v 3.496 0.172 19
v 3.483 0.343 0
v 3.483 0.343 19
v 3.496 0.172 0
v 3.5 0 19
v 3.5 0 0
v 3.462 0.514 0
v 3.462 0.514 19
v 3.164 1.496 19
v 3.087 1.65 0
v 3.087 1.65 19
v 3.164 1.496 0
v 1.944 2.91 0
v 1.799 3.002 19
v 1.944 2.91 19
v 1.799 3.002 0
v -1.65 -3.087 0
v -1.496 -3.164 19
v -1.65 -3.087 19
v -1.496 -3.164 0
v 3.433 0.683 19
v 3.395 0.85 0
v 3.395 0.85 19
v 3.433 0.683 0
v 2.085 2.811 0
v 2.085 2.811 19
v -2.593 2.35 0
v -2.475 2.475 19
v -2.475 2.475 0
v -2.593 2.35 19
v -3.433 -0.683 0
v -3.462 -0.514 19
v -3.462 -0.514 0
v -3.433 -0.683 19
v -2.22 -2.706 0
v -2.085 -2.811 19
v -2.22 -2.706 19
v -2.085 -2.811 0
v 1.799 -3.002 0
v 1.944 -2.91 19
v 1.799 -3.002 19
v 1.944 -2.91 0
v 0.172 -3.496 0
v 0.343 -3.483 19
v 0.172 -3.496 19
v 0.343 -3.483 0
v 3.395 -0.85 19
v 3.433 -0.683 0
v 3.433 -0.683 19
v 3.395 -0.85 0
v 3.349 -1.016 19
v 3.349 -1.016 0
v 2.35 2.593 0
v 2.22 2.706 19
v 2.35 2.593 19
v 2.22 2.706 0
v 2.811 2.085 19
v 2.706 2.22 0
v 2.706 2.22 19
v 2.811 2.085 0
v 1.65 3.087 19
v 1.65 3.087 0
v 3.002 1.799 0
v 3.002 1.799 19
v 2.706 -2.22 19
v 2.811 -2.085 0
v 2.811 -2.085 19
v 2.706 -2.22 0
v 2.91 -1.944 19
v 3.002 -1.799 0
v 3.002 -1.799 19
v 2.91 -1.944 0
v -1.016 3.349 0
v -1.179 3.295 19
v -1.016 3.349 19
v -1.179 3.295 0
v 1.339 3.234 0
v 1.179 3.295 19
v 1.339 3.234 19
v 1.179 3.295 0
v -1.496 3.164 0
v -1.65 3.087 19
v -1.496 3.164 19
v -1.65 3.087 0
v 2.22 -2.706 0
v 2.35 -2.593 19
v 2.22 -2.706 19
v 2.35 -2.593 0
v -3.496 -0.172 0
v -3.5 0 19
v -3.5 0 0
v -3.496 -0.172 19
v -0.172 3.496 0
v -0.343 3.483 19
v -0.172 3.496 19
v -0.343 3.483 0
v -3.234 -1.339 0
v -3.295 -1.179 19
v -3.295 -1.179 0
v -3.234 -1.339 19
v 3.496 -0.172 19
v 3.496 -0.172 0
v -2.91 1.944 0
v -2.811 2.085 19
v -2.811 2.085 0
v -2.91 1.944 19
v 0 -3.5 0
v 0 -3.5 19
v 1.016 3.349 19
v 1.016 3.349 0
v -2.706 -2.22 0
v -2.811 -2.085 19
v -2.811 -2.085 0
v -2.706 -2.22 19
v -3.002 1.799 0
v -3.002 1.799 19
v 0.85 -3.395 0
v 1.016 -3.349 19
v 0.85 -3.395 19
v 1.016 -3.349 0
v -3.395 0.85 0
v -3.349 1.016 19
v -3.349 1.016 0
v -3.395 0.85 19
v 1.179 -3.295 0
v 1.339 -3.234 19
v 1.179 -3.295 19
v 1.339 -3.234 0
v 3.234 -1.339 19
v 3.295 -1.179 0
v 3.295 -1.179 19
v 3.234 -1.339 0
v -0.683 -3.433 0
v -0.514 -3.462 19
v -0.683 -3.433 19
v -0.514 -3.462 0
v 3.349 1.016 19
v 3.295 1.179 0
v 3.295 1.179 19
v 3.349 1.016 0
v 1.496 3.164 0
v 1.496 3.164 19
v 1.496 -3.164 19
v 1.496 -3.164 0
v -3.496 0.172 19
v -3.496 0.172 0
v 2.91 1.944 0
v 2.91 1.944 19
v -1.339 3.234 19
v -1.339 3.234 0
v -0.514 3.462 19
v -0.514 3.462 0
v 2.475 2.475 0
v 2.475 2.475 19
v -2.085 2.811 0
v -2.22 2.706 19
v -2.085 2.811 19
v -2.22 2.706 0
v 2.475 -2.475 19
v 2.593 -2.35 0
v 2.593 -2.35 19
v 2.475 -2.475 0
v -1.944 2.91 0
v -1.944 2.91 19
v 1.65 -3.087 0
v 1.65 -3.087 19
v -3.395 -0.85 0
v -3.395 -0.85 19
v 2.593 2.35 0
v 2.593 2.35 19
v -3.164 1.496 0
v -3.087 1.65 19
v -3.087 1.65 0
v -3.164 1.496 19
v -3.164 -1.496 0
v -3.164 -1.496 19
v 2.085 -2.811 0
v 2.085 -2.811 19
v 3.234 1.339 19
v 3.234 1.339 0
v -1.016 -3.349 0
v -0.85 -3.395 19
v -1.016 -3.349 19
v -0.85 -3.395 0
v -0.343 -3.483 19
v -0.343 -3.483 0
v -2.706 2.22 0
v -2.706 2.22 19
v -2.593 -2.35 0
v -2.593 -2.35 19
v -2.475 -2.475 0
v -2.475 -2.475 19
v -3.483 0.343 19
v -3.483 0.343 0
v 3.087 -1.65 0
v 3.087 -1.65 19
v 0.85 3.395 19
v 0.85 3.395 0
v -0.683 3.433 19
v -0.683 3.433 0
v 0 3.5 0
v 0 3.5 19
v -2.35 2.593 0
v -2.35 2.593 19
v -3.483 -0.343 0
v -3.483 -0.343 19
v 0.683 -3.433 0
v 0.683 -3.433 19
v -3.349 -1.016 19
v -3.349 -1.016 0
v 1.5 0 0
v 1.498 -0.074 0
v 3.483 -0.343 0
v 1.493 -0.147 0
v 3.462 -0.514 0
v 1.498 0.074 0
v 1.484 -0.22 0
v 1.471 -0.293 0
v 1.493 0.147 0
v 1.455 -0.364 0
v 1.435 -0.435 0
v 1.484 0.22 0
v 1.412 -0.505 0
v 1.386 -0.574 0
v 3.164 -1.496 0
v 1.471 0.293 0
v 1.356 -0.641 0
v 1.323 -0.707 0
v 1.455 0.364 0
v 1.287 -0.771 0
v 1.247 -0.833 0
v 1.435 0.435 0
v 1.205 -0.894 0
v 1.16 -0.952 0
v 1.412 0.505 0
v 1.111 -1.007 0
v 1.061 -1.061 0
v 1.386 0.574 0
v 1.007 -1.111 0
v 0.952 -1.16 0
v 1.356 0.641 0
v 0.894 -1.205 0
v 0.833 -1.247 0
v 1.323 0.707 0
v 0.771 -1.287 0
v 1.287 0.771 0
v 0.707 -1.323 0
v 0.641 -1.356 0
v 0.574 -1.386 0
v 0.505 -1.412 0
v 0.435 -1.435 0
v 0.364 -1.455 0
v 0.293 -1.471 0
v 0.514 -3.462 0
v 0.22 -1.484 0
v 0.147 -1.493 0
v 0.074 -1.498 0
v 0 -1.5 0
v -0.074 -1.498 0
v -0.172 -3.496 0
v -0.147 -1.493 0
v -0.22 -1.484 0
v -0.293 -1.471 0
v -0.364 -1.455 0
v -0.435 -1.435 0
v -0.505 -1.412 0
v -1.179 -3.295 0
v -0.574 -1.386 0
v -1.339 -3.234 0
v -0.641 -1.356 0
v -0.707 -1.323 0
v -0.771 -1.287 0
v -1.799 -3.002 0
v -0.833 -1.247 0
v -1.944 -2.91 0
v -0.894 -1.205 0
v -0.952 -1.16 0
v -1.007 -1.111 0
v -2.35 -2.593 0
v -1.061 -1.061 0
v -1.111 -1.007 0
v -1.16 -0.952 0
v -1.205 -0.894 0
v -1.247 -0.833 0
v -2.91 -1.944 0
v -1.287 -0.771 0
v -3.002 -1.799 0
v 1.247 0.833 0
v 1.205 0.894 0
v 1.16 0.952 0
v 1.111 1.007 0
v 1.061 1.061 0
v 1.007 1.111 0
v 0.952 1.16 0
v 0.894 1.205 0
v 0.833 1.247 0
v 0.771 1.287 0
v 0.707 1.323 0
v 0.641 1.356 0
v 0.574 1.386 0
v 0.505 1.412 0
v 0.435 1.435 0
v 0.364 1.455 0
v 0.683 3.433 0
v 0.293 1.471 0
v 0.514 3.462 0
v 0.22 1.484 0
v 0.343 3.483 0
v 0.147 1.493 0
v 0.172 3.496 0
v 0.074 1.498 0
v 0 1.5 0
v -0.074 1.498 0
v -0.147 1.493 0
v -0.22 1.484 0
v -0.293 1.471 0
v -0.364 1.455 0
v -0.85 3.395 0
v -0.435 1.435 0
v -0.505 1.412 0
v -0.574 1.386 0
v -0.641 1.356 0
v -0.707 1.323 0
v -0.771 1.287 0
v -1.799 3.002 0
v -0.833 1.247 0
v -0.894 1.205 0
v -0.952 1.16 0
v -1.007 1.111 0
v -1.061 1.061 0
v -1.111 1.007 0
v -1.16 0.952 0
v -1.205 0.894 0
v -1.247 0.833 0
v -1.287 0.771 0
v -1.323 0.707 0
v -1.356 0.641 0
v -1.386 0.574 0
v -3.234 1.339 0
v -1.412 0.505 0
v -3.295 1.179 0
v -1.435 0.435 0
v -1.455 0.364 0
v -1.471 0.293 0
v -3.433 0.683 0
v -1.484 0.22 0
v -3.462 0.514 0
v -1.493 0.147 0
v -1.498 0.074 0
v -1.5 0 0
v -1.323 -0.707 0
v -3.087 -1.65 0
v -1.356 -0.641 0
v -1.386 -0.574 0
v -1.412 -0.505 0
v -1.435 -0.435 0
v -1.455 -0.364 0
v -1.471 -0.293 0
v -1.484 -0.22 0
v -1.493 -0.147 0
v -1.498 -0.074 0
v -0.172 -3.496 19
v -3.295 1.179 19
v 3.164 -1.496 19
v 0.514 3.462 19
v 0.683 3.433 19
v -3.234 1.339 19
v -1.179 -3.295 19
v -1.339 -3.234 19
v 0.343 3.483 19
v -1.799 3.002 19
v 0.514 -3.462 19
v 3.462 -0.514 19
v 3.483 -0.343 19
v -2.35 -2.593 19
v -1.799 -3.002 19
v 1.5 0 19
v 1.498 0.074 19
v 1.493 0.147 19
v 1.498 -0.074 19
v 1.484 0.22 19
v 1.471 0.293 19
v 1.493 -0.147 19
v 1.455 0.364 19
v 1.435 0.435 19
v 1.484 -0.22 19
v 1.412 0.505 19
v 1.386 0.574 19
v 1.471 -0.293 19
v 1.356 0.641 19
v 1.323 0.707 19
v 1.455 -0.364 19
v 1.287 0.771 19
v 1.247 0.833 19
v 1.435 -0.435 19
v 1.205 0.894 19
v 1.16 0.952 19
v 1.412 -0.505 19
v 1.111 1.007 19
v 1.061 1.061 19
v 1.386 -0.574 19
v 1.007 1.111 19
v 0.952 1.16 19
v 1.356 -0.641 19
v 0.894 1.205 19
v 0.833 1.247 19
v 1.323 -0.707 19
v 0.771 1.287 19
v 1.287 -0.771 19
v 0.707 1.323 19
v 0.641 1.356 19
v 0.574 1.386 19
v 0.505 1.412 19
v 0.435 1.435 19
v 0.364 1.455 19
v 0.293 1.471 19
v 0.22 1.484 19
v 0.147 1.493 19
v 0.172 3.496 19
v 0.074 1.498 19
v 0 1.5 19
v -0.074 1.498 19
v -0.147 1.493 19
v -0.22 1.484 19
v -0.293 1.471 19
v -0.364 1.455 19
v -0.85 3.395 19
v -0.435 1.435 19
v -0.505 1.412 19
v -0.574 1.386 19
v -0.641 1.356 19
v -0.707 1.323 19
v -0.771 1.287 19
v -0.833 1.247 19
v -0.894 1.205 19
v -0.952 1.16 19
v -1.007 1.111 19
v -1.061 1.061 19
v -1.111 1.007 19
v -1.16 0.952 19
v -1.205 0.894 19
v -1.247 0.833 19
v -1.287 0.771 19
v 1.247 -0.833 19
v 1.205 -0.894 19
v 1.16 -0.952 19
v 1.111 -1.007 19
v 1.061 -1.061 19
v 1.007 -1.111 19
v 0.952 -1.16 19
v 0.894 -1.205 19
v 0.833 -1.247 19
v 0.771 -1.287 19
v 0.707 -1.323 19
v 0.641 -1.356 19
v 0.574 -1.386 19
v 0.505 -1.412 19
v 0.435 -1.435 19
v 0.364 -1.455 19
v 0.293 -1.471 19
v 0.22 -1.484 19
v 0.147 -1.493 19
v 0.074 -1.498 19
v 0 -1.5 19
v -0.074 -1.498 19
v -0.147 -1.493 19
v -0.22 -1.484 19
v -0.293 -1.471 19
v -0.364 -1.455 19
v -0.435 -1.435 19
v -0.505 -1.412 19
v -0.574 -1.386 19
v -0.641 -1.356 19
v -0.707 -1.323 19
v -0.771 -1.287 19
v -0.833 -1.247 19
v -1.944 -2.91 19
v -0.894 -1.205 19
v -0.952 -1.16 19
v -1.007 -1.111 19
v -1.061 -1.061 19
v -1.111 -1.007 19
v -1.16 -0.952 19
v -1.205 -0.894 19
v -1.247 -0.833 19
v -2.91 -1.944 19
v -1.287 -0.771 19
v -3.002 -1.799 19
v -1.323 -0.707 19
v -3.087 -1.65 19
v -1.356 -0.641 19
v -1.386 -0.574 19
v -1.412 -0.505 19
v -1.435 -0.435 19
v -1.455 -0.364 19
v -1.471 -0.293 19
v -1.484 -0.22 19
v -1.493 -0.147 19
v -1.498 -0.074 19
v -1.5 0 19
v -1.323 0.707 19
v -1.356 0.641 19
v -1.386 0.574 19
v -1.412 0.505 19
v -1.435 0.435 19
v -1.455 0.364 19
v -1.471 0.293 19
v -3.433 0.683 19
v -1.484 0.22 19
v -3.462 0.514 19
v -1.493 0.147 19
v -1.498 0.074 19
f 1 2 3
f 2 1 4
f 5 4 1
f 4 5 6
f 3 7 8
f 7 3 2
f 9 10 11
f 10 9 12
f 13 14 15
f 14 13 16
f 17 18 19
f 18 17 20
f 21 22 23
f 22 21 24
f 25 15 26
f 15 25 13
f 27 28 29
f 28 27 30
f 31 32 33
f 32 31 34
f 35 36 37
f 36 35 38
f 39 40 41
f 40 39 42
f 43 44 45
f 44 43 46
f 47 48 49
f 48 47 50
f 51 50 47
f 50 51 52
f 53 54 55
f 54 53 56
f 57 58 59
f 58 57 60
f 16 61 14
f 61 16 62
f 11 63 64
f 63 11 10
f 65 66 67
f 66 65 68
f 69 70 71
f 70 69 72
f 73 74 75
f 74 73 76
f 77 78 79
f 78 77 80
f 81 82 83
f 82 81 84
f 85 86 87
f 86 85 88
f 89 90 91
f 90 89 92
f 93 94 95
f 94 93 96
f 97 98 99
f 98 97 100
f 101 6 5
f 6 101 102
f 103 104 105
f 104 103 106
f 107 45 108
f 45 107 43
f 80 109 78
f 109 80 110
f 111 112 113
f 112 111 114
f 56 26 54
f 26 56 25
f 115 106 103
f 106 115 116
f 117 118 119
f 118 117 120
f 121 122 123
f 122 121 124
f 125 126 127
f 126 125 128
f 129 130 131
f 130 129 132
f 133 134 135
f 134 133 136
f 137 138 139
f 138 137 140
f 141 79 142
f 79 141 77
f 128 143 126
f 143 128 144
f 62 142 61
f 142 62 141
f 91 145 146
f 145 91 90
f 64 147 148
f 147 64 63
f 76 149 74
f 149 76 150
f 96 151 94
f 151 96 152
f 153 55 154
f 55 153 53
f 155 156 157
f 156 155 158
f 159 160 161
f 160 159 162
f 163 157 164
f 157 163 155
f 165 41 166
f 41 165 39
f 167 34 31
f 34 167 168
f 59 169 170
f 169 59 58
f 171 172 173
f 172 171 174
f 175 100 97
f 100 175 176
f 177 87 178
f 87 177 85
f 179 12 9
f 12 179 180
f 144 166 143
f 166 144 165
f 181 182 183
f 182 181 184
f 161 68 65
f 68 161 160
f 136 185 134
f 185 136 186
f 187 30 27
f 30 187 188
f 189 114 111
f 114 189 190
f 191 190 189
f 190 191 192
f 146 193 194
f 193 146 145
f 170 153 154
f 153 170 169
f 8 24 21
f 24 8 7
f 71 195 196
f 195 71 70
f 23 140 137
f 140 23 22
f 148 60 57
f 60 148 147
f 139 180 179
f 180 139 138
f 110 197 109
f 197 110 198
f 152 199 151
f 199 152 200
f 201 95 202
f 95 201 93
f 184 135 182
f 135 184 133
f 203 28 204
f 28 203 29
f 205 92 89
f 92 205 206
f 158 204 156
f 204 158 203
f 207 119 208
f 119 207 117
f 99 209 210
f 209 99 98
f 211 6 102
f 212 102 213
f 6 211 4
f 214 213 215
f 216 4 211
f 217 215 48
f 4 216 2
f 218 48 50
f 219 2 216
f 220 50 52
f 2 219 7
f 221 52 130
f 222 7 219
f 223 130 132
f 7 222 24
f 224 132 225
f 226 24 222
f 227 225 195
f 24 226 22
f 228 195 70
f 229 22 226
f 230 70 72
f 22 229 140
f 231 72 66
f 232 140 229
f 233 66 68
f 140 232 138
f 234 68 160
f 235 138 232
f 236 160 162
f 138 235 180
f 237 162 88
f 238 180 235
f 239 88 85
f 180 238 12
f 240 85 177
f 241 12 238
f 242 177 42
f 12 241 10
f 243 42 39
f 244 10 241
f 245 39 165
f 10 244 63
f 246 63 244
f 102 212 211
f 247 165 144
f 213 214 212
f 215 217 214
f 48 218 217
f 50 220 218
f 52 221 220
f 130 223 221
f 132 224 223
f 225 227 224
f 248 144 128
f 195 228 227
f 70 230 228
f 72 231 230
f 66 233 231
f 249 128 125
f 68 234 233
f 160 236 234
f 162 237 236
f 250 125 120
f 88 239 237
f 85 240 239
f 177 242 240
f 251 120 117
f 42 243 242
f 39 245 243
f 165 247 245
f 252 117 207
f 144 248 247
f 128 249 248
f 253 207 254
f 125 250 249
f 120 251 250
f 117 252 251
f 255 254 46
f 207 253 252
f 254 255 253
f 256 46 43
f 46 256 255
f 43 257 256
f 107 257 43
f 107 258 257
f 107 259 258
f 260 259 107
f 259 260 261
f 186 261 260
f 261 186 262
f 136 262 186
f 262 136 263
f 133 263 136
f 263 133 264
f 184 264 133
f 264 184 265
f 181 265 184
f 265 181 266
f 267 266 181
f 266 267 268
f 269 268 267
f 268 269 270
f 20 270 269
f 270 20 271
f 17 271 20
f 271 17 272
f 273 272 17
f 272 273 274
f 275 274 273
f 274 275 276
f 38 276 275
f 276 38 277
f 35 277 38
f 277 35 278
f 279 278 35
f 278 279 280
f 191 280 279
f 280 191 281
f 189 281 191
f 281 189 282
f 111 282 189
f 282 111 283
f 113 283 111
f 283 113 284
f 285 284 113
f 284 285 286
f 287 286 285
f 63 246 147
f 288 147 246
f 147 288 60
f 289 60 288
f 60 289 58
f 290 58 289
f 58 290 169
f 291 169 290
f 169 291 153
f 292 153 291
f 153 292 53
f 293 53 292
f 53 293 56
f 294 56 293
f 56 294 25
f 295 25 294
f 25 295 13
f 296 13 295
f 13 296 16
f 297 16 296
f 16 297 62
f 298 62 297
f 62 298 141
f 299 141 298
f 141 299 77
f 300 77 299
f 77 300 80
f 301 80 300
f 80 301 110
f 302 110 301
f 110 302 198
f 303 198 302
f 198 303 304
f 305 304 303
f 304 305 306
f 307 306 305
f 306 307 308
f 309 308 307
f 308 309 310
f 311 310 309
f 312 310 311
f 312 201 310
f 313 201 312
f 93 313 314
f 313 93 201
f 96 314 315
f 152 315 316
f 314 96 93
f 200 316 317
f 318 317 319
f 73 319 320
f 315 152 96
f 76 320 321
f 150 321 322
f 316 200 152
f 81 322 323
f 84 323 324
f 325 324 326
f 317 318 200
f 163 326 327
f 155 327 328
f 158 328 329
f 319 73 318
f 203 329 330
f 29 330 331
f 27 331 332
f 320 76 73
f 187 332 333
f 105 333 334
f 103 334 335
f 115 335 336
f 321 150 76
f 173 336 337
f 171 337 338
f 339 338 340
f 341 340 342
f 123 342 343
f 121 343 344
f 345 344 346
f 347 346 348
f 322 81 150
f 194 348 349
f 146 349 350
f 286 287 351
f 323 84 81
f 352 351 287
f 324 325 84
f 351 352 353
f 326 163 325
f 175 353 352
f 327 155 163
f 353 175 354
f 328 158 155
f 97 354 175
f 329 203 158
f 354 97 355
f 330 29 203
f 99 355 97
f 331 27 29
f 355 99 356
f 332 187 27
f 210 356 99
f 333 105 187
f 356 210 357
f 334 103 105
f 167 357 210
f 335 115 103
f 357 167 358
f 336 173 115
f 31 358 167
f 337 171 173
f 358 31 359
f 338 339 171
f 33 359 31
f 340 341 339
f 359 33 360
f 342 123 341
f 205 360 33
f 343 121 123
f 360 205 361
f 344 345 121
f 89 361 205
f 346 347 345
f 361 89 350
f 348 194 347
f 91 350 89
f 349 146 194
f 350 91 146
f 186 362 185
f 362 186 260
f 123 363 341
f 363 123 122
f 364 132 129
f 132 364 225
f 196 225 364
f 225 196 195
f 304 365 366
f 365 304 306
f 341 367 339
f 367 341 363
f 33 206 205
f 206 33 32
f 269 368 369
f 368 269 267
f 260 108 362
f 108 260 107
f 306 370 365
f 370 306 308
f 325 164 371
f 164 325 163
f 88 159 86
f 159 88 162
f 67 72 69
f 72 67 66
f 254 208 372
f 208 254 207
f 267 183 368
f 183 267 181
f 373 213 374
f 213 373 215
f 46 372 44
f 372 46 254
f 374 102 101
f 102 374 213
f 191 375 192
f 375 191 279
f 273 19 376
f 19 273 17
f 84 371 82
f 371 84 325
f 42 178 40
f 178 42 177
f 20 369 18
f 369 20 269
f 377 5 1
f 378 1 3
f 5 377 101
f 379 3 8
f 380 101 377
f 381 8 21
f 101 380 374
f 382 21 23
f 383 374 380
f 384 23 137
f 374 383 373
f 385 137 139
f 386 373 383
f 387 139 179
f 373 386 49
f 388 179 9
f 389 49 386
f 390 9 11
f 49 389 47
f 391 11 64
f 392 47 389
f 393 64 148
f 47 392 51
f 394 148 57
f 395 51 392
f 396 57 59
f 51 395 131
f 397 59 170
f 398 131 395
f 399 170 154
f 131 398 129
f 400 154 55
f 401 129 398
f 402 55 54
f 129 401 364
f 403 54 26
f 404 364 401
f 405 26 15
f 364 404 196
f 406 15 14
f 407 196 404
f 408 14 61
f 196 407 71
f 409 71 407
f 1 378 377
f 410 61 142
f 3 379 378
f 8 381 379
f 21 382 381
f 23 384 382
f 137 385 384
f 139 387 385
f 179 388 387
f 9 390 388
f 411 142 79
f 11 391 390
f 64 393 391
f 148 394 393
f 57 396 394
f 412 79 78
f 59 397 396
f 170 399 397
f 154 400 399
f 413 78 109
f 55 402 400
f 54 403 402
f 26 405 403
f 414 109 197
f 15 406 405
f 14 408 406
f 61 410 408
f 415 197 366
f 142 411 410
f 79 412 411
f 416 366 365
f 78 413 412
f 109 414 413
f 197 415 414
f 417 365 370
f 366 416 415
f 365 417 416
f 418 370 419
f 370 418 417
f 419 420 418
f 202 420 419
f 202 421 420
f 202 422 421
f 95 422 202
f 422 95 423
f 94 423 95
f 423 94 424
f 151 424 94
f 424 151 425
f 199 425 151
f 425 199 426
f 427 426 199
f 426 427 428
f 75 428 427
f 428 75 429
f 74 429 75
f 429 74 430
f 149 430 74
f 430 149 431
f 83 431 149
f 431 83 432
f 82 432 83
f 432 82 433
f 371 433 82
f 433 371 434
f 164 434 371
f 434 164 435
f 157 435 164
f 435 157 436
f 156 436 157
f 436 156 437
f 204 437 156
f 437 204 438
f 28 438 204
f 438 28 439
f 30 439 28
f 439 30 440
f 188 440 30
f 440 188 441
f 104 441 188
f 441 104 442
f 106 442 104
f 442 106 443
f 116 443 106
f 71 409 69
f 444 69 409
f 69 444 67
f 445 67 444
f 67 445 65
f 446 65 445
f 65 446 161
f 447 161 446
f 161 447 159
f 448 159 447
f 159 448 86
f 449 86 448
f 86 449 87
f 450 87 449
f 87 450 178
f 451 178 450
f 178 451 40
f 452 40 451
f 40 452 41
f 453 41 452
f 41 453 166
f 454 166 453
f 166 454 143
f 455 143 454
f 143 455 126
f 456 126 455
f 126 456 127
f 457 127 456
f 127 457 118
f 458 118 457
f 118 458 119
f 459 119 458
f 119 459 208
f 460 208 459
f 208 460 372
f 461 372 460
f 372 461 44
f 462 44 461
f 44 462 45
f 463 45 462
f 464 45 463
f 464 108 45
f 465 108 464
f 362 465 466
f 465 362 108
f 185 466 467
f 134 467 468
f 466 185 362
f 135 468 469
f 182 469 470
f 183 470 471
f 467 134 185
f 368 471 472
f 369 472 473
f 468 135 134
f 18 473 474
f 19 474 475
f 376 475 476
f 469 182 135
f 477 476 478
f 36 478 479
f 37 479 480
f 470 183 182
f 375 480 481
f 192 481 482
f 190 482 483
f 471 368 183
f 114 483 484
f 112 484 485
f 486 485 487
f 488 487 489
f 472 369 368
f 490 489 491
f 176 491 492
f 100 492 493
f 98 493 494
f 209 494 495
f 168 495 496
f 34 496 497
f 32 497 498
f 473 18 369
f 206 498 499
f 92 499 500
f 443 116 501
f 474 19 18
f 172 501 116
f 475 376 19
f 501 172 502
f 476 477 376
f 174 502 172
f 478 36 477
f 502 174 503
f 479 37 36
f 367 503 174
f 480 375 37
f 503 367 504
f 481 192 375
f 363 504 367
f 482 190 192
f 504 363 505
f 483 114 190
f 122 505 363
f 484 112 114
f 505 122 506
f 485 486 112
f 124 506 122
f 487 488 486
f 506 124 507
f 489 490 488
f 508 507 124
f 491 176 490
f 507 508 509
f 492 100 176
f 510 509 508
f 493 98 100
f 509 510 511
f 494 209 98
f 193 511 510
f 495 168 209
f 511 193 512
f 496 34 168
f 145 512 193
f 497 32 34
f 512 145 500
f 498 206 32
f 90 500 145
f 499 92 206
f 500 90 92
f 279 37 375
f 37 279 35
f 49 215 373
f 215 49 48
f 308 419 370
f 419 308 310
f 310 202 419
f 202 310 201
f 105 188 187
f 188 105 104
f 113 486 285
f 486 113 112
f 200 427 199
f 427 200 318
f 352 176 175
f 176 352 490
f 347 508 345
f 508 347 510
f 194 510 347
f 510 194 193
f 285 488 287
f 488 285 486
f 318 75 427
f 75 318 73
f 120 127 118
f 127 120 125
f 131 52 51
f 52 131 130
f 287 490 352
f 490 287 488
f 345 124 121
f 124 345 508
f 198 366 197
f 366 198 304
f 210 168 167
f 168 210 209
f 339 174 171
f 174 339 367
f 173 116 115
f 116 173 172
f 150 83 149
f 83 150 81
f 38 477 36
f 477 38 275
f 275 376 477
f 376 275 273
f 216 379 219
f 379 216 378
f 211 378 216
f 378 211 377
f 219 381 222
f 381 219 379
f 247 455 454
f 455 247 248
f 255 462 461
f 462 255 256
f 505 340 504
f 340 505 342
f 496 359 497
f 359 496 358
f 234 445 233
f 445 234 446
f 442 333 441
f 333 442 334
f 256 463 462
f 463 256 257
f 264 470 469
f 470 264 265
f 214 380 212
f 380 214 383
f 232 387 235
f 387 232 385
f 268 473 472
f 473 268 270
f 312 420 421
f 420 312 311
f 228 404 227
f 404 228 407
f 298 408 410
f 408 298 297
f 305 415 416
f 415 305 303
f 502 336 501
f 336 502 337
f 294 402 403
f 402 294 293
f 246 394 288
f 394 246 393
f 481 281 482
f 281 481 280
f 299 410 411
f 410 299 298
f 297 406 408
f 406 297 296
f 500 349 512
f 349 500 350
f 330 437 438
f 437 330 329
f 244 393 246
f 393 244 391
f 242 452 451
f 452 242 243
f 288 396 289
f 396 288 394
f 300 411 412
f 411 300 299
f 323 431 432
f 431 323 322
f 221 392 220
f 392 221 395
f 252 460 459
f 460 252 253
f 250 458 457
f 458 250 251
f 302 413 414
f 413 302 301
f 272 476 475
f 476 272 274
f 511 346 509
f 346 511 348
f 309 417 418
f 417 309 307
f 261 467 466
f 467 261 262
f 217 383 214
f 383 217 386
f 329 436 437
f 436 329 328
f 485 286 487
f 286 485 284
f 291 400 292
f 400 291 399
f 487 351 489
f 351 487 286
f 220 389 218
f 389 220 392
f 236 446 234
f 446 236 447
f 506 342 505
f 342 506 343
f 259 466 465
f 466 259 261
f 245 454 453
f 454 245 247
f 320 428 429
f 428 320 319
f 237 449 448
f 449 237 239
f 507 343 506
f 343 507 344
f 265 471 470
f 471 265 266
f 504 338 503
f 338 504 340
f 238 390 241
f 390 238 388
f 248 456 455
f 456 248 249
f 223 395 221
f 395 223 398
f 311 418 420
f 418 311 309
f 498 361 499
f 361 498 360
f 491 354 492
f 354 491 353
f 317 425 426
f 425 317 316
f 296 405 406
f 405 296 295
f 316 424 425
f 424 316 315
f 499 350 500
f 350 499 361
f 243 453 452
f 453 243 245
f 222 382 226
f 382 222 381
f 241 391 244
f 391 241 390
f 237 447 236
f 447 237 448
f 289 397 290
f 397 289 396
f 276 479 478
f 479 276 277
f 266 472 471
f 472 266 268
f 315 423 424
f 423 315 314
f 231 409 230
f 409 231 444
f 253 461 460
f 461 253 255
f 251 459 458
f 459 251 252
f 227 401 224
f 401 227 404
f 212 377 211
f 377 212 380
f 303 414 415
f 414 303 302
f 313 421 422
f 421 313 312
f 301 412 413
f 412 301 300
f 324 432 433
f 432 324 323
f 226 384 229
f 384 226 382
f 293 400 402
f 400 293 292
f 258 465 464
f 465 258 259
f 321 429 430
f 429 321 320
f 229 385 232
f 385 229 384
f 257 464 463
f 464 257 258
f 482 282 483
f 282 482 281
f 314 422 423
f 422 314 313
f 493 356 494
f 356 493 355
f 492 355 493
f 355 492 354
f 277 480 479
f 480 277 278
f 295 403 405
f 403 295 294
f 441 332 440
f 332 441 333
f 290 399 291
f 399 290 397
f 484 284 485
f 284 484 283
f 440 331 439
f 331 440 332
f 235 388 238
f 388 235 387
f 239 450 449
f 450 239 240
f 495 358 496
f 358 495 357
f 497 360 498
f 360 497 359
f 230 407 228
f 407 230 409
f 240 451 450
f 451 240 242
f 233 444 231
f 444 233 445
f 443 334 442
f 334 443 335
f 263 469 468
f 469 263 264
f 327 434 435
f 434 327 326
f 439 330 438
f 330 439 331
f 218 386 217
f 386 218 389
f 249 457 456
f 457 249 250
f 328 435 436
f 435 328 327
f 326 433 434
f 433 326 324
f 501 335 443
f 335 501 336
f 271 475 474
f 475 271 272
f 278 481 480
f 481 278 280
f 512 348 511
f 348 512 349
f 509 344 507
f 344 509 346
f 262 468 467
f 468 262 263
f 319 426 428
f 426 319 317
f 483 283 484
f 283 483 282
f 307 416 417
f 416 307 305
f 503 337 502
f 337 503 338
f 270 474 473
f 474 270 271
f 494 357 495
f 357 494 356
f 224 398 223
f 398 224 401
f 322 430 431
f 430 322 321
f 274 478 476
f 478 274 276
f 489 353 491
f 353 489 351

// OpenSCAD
$fn = 128;

bore_d = 3.0;
od_d   = 7.0;
len    = 19.0;

difference() {
  cylinder(d = od_d, h = len, center = false);
  translate([0,0,-0.1]) cylinder(d = bore_d, h = len + 0.2, center = false);
}
